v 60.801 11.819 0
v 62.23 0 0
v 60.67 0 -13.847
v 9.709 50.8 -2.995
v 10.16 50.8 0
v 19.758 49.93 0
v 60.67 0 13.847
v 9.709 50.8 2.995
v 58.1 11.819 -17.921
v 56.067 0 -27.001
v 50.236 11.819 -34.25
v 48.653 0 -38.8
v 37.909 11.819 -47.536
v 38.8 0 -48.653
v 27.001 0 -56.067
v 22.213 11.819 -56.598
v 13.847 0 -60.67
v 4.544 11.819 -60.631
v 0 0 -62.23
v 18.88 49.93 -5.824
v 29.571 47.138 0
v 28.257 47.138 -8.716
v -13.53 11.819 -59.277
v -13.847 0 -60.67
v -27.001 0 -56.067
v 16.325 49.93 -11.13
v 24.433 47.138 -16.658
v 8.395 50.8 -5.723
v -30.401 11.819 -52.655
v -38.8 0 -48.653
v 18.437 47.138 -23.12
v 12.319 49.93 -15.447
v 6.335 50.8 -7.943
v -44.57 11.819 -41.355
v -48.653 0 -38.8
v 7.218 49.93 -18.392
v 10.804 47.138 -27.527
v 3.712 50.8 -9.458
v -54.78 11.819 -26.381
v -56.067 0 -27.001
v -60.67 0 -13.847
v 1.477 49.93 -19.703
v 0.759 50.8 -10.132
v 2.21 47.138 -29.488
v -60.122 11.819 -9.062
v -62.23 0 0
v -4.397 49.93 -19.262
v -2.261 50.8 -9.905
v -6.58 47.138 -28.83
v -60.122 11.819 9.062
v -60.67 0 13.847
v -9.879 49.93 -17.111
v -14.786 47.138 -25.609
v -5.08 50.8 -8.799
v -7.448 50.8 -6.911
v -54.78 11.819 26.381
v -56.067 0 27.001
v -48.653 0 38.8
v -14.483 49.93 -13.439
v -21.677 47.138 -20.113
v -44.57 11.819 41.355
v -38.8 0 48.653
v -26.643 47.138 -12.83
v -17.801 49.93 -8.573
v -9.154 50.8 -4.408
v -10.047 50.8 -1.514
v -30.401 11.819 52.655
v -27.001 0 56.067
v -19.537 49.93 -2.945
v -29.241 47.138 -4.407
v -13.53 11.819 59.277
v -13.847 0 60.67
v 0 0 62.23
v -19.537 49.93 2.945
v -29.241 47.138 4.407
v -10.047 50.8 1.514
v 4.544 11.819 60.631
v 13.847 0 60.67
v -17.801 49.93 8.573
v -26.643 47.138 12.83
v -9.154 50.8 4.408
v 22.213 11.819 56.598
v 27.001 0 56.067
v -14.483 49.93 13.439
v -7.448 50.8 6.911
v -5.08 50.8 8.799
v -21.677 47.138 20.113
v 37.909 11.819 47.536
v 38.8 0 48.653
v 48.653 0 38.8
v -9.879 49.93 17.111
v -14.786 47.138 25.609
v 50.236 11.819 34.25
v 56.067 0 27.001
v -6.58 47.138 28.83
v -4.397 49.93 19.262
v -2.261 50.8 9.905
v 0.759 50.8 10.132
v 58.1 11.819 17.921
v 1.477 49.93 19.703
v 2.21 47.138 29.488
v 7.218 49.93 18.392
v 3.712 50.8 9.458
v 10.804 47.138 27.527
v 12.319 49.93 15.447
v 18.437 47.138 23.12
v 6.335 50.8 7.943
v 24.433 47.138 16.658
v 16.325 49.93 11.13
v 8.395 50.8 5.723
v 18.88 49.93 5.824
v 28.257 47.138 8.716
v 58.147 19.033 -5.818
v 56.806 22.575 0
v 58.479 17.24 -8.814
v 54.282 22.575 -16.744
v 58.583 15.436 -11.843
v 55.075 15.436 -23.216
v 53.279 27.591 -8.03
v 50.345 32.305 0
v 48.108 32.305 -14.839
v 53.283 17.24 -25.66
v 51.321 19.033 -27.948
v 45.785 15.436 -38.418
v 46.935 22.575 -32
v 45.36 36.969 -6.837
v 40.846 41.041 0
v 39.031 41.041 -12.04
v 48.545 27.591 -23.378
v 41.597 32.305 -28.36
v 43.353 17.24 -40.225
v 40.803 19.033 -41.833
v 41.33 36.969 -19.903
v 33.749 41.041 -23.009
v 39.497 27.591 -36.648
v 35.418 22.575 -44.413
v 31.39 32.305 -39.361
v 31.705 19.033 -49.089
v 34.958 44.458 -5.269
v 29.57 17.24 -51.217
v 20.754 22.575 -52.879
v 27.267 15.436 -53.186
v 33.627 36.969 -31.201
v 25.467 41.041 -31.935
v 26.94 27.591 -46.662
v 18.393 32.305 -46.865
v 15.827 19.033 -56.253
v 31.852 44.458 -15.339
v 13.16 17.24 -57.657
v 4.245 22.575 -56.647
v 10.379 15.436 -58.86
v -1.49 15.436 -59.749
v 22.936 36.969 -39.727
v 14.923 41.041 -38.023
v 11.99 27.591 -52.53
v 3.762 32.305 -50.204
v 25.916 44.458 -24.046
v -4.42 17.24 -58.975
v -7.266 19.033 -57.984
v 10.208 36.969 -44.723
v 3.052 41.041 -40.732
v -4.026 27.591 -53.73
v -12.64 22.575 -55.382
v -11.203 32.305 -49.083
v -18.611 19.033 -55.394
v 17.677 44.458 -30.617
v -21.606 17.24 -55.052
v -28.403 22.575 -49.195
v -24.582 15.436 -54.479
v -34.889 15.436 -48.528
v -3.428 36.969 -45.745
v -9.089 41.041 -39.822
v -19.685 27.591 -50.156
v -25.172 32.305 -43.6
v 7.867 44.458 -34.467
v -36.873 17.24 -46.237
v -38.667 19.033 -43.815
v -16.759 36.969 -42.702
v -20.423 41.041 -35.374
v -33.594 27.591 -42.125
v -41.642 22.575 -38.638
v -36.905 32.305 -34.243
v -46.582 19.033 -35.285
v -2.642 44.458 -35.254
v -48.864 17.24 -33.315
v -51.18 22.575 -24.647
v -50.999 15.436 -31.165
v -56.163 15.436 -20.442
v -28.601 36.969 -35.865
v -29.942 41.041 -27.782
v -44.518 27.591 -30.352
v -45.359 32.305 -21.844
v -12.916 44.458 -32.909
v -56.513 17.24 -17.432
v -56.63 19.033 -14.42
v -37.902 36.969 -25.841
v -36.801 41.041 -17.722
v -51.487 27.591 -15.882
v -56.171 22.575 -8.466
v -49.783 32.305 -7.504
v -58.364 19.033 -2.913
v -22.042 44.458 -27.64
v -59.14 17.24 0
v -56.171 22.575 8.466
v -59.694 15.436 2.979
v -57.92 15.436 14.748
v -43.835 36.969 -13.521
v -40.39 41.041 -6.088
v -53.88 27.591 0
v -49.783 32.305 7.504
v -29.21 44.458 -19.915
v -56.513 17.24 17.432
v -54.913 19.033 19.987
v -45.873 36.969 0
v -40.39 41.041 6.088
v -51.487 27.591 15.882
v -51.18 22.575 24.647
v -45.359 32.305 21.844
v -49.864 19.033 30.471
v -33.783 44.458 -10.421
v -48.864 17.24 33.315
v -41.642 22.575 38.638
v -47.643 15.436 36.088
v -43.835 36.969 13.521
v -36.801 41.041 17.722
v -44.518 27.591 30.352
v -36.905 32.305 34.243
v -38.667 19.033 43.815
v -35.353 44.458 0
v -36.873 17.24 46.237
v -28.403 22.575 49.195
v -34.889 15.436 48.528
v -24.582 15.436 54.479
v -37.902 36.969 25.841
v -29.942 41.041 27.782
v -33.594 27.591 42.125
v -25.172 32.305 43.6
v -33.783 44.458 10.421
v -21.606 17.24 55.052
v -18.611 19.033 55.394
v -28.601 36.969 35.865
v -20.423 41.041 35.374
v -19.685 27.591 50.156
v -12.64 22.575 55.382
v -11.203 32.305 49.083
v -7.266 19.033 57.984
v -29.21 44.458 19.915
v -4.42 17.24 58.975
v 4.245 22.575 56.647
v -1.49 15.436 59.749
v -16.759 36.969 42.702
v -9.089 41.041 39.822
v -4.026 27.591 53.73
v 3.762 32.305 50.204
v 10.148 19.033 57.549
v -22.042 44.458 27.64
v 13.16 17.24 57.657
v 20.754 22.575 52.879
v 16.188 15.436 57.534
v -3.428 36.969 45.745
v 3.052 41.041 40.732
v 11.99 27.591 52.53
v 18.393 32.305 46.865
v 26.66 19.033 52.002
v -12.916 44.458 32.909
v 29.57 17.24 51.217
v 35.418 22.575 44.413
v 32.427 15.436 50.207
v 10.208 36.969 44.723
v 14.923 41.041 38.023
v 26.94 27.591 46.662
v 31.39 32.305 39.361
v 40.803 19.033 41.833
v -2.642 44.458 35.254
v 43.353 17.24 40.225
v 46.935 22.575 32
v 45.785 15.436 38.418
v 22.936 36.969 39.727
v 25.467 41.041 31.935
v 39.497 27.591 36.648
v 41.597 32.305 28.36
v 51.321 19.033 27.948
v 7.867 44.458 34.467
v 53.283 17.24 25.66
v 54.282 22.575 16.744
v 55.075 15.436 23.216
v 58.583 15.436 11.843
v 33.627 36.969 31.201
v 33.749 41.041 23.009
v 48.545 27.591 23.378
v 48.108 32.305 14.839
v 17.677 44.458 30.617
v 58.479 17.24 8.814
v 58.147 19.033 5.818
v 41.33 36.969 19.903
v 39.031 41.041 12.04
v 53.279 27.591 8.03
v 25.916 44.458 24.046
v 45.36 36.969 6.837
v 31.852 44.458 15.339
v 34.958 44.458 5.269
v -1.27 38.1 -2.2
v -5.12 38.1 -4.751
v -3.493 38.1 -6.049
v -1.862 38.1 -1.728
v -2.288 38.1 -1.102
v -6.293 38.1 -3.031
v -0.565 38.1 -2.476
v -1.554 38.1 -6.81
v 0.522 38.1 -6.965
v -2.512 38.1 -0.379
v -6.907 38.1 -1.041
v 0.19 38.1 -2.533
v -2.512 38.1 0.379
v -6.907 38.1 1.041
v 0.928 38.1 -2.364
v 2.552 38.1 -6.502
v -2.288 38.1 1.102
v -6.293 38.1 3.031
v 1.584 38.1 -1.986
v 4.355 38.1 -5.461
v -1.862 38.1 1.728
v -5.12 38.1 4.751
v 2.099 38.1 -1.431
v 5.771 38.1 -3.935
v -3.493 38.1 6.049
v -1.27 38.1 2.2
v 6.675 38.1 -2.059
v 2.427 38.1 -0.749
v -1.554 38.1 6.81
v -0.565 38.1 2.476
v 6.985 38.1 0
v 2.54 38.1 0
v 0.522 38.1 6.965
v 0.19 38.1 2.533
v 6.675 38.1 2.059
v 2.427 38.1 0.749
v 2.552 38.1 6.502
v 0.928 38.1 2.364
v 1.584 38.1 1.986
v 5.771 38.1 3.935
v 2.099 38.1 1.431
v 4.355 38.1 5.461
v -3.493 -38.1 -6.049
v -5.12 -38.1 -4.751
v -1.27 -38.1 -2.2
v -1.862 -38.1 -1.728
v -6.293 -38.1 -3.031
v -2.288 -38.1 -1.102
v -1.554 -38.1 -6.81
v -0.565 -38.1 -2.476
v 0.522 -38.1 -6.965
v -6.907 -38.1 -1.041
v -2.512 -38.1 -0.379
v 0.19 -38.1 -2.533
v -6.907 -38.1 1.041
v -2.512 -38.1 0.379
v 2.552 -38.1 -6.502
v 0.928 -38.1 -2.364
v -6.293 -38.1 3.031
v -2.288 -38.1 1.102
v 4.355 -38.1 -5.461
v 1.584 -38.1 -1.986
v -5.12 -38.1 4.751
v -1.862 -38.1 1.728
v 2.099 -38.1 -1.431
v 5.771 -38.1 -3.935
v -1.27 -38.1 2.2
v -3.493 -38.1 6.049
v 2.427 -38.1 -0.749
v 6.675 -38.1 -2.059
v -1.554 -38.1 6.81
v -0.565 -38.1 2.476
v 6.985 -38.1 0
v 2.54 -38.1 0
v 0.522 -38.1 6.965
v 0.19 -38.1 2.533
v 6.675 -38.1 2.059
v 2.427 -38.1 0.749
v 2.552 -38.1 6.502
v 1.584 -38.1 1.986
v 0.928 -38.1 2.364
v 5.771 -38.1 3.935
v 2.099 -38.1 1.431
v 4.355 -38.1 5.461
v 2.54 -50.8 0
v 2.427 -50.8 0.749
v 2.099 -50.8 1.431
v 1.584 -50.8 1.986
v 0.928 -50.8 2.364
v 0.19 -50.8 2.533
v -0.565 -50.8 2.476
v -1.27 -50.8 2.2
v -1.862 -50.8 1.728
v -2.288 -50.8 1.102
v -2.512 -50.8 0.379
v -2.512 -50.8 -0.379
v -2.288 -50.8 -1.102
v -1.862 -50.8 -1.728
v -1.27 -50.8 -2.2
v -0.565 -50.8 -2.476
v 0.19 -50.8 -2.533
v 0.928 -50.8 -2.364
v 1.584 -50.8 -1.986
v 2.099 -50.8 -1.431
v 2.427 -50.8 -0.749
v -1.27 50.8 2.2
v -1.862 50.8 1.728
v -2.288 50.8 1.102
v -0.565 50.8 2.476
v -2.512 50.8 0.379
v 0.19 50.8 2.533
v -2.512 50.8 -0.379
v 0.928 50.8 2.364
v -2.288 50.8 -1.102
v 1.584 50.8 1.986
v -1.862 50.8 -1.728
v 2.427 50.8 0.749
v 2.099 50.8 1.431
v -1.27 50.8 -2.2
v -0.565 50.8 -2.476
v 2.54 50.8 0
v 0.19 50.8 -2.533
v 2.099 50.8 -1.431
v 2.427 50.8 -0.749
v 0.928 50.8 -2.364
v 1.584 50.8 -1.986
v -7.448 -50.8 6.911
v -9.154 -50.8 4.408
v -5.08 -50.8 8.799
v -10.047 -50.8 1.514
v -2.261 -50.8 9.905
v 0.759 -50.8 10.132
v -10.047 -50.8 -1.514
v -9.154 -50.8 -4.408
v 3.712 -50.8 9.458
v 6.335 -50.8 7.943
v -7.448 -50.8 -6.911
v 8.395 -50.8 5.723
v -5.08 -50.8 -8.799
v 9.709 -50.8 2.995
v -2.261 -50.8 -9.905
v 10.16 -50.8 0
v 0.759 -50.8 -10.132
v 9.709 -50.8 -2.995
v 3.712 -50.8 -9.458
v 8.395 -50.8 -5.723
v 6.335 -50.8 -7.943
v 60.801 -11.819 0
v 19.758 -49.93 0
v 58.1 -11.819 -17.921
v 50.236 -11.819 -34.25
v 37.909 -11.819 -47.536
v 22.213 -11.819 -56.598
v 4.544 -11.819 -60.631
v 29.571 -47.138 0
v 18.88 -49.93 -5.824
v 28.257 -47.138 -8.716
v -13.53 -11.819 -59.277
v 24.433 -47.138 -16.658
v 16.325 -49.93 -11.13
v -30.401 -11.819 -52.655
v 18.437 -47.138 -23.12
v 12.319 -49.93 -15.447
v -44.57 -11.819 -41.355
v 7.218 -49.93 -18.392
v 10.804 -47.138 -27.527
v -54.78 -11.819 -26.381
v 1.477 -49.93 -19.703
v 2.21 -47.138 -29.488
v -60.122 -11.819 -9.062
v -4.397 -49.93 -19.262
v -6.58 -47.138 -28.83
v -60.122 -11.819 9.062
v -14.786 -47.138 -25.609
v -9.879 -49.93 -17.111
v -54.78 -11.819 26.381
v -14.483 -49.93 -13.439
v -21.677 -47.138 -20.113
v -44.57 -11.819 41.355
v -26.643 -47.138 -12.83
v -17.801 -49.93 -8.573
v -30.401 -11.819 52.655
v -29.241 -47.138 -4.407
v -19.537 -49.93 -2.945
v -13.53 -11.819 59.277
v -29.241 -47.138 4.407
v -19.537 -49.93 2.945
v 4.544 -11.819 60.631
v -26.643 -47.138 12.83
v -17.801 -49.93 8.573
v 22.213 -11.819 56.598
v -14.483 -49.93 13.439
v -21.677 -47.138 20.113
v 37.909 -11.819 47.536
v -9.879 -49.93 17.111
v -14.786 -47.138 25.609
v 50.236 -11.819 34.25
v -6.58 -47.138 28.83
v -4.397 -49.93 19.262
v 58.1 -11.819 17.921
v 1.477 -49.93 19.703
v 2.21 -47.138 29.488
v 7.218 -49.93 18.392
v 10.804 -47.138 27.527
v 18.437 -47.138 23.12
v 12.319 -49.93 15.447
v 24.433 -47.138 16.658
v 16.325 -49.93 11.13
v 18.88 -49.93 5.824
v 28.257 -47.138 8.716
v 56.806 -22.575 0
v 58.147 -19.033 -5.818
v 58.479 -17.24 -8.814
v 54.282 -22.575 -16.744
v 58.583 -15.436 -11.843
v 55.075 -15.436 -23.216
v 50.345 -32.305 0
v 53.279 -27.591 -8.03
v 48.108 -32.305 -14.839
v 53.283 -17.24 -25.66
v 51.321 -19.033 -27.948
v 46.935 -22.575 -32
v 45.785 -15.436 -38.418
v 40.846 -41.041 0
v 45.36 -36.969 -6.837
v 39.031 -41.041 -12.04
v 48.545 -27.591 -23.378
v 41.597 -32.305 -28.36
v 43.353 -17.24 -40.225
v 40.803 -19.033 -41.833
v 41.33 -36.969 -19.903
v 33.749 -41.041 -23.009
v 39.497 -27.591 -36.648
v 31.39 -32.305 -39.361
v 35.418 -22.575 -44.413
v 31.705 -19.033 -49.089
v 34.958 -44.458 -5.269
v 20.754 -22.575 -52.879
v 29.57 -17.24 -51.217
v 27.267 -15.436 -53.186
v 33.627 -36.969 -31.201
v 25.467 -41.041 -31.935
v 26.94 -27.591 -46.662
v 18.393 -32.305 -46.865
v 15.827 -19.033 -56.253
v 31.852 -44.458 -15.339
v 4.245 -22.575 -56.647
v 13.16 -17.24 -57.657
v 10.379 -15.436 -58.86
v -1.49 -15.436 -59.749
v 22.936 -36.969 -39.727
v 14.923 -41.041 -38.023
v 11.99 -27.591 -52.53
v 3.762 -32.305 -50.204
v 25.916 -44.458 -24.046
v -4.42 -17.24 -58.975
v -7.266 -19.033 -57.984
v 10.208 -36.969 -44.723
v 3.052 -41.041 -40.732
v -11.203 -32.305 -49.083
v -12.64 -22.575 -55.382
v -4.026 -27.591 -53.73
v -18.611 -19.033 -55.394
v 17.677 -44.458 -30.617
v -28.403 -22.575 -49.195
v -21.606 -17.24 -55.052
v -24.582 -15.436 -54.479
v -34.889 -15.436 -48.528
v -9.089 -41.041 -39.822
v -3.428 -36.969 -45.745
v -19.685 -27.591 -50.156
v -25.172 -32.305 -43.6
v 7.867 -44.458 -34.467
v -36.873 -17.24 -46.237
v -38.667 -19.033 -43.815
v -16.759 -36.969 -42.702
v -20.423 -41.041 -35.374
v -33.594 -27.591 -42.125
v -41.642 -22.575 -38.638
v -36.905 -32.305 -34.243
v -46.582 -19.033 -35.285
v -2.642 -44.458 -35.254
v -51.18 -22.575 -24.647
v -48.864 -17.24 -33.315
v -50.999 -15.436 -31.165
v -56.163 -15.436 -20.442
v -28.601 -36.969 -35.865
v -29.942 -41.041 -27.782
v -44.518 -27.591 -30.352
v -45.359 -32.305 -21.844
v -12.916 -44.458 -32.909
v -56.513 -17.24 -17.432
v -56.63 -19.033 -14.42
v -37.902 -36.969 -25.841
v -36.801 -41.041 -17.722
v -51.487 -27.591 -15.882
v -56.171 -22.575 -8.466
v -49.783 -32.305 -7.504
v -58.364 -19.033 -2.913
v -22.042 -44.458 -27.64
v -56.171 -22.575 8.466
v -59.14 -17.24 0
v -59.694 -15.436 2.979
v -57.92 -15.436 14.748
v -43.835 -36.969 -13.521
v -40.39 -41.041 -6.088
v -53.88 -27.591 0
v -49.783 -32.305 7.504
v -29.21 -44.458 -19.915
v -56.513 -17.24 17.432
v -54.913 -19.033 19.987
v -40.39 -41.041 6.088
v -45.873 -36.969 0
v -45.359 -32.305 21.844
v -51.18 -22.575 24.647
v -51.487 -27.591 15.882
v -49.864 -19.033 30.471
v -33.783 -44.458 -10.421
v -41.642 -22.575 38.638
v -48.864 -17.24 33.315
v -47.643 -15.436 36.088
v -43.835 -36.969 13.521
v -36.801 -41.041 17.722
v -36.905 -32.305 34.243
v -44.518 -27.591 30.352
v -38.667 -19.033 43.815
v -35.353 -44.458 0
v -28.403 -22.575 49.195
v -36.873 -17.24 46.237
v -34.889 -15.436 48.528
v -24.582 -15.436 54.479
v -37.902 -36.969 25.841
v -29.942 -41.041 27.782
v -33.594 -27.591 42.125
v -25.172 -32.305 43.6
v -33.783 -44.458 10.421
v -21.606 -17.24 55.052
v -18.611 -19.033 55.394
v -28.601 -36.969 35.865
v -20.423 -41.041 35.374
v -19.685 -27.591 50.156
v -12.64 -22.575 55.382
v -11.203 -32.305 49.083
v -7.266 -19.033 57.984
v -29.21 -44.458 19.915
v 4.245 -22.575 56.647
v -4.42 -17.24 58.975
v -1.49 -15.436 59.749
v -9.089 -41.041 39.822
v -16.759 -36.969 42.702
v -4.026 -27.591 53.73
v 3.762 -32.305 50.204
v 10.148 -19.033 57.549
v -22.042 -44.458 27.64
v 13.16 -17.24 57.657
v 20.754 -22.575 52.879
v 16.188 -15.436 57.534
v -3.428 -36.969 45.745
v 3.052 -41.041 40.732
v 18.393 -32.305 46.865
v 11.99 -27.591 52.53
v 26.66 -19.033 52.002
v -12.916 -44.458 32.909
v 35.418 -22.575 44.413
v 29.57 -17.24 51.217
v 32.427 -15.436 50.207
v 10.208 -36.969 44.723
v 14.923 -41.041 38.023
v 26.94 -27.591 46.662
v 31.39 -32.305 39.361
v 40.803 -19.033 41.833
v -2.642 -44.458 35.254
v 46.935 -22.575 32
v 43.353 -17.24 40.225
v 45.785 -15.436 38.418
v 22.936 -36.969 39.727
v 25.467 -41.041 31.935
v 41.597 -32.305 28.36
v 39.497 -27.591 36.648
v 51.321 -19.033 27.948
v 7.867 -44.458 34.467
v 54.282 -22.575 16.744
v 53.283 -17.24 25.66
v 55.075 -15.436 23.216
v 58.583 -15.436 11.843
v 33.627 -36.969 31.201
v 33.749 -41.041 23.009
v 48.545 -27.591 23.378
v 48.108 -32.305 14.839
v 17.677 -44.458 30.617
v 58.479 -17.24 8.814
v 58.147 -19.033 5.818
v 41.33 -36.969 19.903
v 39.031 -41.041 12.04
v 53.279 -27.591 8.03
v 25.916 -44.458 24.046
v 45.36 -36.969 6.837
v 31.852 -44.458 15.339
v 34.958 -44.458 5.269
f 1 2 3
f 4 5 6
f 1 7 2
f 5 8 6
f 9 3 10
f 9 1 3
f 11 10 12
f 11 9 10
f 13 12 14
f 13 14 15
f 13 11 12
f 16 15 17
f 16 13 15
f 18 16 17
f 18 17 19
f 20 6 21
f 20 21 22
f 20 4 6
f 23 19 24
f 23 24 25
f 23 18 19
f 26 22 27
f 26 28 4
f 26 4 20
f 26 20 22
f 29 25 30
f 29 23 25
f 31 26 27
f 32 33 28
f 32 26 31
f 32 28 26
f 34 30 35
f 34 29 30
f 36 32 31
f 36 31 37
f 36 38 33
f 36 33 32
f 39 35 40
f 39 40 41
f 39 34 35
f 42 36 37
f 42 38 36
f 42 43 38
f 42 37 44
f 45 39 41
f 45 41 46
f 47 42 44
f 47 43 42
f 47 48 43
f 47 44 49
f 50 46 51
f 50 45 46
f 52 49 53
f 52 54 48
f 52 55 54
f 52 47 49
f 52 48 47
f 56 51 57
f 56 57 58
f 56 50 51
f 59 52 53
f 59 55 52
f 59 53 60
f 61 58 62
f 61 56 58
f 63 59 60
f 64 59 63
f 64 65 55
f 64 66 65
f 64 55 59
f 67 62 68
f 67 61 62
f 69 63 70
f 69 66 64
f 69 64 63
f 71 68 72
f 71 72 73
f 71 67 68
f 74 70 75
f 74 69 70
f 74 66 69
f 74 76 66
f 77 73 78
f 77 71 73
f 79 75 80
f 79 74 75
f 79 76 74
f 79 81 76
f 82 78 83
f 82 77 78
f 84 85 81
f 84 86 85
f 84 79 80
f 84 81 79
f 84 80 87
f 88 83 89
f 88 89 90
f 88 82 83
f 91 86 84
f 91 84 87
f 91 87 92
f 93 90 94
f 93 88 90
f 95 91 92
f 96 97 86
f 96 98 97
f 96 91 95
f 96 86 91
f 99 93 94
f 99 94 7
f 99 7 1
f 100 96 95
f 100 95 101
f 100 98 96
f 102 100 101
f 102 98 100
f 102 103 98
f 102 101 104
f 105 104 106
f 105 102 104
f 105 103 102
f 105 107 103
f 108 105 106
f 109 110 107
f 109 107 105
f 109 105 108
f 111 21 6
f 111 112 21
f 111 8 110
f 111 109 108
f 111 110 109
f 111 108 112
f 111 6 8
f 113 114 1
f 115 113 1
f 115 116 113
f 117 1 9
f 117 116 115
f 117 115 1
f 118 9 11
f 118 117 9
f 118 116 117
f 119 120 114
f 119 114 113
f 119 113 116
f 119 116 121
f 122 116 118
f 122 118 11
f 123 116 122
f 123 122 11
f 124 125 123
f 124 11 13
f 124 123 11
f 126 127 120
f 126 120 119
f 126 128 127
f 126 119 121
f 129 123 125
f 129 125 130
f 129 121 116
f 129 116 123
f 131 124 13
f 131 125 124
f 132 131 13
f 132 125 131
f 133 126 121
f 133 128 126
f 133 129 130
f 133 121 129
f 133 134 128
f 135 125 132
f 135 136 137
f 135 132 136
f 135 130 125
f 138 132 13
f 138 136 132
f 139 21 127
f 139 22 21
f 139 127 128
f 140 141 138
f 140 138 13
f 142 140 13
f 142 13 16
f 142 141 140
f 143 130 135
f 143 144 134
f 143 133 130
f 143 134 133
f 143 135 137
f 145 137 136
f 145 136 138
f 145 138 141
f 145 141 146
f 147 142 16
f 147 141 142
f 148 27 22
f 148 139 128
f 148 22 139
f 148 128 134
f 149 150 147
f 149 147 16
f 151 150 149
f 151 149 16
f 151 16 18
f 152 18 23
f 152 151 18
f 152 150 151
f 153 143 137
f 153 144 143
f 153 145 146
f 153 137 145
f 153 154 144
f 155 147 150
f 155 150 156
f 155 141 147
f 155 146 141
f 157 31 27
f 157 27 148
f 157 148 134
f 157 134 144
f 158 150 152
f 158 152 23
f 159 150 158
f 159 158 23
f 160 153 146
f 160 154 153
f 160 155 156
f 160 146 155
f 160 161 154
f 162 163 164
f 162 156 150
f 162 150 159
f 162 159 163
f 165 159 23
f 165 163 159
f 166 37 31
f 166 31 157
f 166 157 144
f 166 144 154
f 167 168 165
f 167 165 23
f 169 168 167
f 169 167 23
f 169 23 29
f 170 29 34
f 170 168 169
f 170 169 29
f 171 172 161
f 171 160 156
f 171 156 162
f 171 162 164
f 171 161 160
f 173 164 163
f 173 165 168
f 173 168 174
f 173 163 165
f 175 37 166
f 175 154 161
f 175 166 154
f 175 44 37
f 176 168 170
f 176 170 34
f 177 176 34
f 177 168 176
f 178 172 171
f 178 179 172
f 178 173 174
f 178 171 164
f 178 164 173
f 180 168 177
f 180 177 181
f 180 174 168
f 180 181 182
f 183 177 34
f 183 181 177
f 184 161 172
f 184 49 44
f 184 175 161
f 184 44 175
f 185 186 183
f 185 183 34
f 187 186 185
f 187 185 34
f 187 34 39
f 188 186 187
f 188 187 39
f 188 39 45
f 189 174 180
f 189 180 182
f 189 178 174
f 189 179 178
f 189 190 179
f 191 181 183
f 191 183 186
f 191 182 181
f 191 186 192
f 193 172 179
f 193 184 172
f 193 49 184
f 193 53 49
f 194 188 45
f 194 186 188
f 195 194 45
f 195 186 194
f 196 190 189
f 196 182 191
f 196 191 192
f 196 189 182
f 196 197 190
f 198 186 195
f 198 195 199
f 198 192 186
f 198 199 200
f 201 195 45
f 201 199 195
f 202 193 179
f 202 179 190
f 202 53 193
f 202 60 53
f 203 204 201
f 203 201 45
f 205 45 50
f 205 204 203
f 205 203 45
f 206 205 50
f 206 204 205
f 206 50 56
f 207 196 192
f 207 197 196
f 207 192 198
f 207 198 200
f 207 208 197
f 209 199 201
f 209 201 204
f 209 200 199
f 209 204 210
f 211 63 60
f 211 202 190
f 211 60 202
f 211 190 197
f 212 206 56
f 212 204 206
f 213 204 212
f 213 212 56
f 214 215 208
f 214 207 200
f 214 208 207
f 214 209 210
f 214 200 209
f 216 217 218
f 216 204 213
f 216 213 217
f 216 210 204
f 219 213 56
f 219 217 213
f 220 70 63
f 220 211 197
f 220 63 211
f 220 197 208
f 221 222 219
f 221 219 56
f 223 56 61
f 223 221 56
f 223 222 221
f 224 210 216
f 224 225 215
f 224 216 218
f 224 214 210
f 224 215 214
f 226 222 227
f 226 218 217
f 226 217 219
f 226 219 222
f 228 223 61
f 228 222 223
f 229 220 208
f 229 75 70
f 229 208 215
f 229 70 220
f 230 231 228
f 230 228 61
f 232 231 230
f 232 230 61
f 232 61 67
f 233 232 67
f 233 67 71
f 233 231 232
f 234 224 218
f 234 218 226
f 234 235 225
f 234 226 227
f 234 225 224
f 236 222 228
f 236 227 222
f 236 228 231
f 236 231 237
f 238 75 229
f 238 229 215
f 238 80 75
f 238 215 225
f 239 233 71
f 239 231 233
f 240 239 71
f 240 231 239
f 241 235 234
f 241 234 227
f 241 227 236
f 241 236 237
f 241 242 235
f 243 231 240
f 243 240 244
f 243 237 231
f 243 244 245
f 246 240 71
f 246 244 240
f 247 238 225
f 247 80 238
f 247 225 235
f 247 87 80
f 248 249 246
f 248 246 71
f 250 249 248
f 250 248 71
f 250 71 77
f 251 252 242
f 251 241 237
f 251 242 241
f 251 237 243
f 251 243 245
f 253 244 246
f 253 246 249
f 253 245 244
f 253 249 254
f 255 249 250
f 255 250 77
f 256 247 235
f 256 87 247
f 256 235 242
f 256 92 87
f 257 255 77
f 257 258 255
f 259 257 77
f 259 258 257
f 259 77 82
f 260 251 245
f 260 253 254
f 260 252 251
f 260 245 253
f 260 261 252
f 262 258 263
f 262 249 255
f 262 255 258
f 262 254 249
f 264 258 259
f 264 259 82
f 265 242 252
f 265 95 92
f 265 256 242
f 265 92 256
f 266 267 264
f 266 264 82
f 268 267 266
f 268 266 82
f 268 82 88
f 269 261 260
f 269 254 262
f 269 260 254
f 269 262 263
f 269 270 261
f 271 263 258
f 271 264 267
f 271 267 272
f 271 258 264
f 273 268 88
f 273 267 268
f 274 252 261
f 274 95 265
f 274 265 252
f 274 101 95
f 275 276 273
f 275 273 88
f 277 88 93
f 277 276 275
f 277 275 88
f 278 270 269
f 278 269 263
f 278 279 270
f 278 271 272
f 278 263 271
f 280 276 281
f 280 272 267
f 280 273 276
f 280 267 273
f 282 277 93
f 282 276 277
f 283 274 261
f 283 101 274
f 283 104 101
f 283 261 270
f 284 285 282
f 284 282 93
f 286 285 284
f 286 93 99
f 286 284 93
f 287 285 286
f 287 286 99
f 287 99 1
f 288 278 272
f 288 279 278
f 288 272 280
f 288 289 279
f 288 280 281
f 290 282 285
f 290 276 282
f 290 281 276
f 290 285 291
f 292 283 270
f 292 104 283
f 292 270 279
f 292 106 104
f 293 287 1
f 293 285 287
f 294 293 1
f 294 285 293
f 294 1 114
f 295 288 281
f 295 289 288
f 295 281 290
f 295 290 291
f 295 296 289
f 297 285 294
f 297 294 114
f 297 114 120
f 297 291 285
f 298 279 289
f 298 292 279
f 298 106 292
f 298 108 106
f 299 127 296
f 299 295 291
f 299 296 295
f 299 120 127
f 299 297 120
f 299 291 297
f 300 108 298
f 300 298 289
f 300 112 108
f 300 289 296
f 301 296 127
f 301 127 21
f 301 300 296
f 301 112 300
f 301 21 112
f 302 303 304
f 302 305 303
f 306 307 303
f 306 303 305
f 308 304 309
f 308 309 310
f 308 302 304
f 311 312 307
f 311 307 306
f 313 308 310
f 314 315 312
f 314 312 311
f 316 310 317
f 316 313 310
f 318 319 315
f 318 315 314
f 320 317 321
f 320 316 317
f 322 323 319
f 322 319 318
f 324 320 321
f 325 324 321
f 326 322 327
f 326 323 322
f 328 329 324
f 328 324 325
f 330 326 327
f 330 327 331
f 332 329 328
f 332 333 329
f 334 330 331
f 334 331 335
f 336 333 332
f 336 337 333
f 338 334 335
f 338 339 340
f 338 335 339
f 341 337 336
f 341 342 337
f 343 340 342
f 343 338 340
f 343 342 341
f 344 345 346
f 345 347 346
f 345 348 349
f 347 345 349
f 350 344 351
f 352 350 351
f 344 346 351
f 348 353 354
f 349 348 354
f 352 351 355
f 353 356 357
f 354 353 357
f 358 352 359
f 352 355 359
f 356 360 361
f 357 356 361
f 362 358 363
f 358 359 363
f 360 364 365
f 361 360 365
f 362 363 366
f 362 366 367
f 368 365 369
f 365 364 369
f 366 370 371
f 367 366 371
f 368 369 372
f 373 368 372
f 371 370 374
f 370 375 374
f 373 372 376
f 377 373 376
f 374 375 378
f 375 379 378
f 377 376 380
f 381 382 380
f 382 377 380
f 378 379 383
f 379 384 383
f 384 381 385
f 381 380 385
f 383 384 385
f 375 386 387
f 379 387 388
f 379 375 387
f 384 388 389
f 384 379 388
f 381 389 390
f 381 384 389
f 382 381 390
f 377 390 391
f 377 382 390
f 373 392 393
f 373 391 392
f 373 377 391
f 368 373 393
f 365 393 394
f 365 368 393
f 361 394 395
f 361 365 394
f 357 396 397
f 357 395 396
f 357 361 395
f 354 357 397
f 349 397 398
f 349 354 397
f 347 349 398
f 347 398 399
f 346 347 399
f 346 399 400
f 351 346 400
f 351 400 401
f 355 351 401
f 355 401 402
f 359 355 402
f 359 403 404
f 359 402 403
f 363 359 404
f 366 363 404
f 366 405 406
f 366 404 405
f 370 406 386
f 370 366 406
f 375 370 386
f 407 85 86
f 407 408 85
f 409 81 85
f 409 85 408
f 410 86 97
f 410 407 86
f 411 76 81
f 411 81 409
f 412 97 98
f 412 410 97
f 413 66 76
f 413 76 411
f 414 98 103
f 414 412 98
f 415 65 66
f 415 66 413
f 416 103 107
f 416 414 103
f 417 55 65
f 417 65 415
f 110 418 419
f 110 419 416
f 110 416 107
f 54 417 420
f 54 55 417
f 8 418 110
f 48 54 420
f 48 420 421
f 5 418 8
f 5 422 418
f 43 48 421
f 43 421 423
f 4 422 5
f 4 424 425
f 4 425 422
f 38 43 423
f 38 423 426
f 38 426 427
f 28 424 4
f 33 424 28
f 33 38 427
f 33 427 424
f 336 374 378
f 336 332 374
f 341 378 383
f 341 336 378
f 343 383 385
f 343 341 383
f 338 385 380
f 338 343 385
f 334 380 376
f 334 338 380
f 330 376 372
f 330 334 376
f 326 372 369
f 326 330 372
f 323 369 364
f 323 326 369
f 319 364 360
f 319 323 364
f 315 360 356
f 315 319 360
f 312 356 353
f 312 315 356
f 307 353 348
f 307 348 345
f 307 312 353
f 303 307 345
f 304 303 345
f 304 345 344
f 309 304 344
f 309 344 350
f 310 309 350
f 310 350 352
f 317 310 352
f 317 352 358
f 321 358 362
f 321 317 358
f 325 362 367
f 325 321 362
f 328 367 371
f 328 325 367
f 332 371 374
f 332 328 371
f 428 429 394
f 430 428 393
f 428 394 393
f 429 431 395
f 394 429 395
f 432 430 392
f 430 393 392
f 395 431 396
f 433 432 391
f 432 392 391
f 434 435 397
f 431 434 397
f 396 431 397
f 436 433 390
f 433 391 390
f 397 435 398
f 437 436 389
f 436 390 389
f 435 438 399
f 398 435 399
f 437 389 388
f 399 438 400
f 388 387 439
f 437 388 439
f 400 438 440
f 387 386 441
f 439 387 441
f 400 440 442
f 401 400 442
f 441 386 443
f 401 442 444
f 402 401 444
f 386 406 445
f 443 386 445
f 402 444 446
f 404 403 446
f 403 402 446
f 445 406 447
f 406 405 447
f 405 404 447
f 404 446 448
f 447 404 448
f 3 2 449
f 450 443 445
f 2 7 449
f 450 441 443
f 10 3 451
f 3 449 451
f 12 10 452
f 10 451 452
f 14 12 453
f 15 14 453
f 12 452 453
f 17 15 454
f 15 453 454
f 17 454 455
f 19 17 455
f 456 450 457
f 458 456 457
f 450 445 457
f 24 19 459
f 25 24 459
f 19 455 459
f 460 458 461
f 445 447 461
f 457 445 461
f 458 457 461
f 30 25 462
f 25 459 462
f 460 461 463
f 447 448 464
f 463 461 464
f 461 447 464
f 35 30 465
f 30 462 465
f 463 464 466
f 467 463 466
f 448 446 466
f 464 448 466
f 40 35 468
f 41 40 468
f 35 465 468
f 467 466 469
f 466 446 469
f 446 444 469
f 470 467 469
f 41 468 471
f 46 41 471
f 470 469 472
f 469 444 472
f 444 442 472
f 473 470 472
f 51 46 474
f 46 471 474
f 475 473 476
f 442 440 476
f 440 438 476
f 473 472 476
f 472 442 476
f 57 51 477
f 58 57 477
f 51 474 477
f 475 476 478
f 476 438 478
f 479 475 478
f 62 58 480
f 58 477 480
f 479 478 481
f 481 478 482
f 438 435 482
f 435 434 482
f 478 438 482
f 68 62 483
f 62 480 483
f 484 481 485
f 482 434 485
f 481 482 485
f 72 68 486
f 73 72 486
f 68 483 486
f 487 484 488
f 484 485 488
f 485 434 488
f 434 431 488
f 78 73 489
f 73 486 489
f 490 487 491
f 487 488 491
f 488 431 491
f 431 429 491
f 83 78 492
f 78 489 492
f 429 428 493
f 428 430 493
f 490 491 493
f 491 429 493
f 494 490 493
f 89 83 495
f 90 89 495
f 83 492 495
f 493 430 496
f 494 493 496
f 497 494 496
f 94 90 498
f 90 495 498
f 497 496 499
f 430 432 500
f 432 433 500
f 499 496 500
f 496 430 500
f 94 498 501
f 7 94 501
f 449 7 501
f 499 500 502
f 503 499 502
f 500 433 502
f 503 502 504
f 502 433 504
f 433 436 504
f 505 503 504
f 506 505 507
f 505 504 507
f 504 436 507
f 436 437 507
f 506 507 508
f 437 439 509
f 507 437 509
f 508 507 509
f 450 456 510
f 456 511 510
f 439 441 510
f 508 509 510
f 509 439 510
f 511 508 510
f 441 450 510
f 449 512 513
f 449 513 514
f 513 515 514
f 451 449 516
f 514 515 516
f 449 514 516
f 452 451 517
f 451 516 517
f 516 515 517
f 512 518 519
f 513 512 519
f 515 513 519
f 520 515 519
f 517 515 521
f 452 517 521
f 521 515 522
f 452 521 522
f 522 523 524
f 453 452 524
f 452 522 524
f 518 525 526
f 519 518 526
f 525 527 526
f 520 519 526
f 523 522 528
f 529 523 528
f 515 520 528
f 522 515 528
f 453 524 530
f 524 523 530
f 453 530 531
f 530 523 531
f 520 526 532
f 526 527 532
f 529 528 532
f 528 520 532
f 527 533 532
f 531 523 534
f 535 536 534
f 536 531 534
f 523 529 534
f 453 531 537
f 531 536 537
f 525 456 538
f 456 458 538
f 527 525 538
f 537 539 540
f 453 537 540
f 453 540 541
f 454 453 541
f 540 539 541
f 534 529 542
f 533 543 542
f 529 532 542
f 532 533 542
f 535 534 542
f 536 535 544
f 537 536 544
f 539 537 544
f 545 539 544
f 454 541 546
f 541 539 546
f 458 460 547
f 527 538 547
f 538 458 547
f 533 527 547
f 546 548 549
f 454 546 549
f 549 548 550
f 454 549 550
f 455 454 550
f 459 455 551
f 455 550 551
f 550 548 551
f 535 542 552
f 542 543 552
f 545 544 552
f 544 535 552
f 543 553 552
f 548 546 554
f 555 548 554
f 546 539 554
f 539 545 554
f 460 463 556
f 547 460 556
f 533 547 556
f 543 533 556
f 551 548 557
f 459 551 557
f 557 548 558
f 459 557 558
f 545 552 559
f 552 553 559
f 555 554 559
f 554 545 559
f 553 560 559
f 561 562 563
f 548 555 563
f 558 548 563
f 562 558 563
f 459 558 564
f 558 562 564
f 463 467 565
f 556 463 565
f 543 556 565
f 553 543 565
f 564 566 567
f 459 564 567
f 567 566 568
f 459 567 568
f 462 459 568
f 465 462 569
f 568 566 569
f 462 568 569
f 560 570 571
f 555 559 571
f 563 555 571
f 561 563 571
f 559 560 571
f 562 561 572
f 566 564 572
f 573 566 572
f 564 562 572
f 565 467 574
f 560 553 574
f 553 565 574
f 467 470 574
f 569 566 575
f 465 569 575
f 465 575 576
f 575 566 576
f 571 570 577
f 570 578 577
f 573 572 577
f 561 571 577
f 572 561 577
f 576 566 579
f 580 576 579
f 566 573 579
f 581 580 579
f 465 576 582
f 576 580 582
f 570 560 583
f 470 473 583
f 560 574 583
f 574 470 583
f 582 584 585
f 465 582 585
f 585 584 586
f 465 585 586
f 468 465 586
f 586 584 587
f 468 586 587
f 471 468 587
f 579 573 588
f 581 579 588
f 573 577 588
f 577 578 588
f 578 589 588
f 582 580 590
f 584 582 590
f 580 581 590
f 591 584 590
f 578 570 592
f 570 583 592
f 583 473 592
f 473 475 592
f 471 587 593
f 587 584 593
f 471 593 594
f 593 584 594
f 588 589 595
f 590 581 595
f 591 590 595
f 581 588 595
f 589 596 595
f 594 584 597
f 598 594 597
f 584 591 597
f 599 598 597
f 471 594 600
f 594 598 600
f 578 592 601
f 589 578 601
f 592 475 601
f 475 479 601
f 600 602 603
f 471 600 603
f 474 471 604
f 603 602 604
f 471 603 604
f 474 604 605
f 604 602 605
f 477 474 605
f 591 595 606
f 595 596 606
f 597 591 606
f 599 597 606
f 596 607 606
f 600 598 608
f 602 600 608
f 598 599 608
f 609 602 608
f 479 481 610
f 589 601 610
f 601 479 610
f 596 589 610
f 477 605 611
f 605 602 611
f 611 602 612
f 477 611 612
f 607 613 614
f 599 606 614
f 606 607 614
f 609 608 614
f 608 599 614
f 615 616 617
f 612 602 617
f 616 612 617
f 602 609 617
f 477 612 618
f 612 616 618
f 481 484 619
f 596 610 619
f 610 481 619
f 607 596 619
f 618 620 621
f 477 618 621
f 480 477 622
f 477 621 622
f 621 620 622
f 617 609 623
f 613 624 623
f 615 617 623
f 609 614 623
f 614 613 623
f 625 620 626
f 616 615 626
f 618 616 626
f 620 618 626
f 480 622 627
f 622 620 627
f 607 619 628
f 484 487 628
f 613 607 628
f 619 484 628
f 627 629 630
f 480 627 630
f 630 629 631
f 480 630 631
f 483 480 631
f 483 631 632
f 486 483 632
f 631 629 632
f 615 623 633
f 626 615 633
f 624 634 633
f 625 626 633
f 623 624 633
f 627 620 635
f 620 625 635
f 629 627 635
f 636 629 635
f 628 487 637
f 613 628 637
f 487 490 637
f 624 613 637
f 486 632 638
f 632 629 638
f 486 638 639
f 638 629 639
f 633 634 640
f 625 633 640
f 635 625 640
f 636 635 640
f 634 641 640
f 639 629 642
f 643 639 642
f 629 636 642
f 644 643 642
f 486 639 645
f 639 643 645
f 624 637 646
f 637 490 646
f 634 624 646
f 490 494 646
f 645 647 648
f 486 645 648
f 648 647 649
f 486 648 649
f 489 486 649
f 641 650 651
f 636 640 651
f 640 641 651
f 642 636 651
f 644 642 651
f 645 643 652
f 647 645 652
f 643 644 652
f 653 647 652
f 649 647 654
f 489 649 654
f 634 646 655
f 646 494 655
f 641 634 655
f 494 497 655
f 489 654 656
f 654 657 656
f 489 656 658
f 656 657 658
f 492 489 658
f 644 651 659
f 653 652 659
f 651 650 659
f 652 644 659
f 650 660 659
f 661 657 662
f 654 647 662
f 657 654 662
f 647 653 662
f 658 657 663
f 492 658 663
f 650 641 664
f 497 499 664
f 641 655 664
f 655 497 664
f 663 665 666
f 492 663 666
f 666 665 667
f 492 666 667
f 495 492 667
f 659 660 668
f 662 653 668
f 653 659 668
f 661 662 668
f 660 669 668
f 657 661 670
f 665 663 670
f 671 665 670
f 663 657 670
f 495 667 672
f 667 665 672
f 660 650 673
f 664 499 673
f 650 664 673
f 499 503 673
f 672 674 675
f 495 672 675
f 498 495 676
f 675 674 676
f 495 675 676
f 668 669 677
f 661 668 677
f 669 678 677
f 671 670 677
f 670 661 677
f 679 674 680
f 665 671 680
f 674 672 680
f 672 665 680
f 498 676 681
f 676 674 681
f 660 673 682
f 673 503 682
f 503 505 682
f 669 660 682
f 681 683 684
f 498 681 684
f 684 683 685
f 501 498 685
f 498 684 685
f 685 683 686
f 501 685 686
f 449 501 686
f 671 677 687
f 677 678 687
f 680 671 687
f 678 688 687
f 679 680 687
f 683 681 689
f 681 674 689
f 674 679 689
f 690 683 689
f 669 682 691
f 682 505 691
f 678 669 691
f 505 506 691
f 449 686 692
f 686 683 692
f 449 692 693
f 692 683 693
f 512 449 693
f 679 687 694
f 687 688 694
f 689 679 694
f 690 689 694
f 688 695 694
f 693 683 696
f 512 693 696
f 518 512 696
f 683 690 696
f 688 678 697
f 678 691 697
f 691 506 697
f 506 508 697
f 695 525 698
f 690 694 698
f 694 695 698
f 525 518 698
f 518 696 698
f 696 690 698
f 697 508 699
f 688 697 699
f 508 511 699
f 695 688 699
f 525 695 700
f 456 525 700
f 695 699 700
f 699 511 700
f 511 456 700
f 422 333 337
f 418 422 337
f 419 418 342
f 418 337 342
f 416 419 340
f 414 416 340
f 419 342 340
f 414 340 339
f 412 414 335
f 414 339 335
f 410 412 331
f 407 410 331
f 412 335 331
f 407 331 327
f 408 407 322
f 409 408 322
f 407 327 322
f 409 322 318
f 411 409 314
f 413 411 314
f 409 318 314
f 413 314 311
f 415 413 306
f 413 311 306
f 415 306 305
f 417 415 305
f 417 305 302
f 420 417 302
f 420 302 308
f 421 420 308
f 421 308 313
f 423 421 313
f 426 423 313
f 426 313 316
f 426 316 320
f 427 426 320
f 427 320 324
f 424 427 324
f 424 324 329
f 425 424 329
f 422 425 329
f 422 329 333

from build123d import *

# Parameters (mm, degrees)
SKETCH5_R          = 6.985
CUT_EXTRUDE1_DEPTH = 38.1
SKETCH6_R          = 2.54
CUT_EXTRUDE2_DEPTH = 38.1


with BuildPart() as part:
    # Sketch4 → Revolve1 (revolve)
    with BuildSketch(Plane.XY):
        with BuildLine():
            Line((0, 0), (62.23, 0))
            add(Edge.make_bspline(
                [(62.23, 0), (62.23, 50.8), (10.16, 50.8)],
                knots=[3.141592654, 3.141592654, 3.141592654, 4.71238898, 4.71238898, 4.71238898], degree=2, weights=[1, 0.707106781, 1]))
            Line((10.16, 50.8), (0, 50.8))
            Line((0, 50.8), (0, 0))
        make_face()
    revolve1 = revolve(axis=Axis((0, 0, 0), (0, 1, 0)))

    # Sketch5 → Cut-Extrude1 (cut)
    with BuildSketch(Plane.XZ):
        Circle(SKETCH5_R)
    cut_extrude1 = extrude(amount=-CUT_EXTRUDE1_DEPTH, mode=Mode.SUBTRACT)

    # Sketch6 → Cut-Extrude2 (cut)
    with BuildSketch(Plane.XZ.offset(-38.1)):
        Circle(SKETCH6_R)
    cut_extrude2 = extrude(amount=-CUT_EXTRUDE2_DEPTH, mode=Mode.SUBTRACT)


with BuildPart() as mirror1_1:
    # Mirror1: Revolve1 across Top Plane
    add(revolve1.mirror(Plane(origin=(0, 0, 0), x_dir=(1, 0, 0), z_dir=(0, 1, 0))))

    # Mirror1 2: Cut-Extrude1, Cut-Extrude2 across Top Plane
    add(cut_extrude1.mirror(Plane(origin=(0, 0, 0), x_dir=(1, 0, 0), z_dir=(0, 1, 0))), mode=Mode.SUBTRACT)
    add(cut_extrude2.mirror(Plane(origin=(0, 0, 0), x_dir=(1, 0, 0), z_dir=(0, 1, 0))), mode=Mode.SUBTRACT)


with BuildPart() as part_1:
    add(part.part)

    # Mirror1 united with what the copies touc: union Mirror1_1
    add(mirror1_1.part)


solid = part_1.part
